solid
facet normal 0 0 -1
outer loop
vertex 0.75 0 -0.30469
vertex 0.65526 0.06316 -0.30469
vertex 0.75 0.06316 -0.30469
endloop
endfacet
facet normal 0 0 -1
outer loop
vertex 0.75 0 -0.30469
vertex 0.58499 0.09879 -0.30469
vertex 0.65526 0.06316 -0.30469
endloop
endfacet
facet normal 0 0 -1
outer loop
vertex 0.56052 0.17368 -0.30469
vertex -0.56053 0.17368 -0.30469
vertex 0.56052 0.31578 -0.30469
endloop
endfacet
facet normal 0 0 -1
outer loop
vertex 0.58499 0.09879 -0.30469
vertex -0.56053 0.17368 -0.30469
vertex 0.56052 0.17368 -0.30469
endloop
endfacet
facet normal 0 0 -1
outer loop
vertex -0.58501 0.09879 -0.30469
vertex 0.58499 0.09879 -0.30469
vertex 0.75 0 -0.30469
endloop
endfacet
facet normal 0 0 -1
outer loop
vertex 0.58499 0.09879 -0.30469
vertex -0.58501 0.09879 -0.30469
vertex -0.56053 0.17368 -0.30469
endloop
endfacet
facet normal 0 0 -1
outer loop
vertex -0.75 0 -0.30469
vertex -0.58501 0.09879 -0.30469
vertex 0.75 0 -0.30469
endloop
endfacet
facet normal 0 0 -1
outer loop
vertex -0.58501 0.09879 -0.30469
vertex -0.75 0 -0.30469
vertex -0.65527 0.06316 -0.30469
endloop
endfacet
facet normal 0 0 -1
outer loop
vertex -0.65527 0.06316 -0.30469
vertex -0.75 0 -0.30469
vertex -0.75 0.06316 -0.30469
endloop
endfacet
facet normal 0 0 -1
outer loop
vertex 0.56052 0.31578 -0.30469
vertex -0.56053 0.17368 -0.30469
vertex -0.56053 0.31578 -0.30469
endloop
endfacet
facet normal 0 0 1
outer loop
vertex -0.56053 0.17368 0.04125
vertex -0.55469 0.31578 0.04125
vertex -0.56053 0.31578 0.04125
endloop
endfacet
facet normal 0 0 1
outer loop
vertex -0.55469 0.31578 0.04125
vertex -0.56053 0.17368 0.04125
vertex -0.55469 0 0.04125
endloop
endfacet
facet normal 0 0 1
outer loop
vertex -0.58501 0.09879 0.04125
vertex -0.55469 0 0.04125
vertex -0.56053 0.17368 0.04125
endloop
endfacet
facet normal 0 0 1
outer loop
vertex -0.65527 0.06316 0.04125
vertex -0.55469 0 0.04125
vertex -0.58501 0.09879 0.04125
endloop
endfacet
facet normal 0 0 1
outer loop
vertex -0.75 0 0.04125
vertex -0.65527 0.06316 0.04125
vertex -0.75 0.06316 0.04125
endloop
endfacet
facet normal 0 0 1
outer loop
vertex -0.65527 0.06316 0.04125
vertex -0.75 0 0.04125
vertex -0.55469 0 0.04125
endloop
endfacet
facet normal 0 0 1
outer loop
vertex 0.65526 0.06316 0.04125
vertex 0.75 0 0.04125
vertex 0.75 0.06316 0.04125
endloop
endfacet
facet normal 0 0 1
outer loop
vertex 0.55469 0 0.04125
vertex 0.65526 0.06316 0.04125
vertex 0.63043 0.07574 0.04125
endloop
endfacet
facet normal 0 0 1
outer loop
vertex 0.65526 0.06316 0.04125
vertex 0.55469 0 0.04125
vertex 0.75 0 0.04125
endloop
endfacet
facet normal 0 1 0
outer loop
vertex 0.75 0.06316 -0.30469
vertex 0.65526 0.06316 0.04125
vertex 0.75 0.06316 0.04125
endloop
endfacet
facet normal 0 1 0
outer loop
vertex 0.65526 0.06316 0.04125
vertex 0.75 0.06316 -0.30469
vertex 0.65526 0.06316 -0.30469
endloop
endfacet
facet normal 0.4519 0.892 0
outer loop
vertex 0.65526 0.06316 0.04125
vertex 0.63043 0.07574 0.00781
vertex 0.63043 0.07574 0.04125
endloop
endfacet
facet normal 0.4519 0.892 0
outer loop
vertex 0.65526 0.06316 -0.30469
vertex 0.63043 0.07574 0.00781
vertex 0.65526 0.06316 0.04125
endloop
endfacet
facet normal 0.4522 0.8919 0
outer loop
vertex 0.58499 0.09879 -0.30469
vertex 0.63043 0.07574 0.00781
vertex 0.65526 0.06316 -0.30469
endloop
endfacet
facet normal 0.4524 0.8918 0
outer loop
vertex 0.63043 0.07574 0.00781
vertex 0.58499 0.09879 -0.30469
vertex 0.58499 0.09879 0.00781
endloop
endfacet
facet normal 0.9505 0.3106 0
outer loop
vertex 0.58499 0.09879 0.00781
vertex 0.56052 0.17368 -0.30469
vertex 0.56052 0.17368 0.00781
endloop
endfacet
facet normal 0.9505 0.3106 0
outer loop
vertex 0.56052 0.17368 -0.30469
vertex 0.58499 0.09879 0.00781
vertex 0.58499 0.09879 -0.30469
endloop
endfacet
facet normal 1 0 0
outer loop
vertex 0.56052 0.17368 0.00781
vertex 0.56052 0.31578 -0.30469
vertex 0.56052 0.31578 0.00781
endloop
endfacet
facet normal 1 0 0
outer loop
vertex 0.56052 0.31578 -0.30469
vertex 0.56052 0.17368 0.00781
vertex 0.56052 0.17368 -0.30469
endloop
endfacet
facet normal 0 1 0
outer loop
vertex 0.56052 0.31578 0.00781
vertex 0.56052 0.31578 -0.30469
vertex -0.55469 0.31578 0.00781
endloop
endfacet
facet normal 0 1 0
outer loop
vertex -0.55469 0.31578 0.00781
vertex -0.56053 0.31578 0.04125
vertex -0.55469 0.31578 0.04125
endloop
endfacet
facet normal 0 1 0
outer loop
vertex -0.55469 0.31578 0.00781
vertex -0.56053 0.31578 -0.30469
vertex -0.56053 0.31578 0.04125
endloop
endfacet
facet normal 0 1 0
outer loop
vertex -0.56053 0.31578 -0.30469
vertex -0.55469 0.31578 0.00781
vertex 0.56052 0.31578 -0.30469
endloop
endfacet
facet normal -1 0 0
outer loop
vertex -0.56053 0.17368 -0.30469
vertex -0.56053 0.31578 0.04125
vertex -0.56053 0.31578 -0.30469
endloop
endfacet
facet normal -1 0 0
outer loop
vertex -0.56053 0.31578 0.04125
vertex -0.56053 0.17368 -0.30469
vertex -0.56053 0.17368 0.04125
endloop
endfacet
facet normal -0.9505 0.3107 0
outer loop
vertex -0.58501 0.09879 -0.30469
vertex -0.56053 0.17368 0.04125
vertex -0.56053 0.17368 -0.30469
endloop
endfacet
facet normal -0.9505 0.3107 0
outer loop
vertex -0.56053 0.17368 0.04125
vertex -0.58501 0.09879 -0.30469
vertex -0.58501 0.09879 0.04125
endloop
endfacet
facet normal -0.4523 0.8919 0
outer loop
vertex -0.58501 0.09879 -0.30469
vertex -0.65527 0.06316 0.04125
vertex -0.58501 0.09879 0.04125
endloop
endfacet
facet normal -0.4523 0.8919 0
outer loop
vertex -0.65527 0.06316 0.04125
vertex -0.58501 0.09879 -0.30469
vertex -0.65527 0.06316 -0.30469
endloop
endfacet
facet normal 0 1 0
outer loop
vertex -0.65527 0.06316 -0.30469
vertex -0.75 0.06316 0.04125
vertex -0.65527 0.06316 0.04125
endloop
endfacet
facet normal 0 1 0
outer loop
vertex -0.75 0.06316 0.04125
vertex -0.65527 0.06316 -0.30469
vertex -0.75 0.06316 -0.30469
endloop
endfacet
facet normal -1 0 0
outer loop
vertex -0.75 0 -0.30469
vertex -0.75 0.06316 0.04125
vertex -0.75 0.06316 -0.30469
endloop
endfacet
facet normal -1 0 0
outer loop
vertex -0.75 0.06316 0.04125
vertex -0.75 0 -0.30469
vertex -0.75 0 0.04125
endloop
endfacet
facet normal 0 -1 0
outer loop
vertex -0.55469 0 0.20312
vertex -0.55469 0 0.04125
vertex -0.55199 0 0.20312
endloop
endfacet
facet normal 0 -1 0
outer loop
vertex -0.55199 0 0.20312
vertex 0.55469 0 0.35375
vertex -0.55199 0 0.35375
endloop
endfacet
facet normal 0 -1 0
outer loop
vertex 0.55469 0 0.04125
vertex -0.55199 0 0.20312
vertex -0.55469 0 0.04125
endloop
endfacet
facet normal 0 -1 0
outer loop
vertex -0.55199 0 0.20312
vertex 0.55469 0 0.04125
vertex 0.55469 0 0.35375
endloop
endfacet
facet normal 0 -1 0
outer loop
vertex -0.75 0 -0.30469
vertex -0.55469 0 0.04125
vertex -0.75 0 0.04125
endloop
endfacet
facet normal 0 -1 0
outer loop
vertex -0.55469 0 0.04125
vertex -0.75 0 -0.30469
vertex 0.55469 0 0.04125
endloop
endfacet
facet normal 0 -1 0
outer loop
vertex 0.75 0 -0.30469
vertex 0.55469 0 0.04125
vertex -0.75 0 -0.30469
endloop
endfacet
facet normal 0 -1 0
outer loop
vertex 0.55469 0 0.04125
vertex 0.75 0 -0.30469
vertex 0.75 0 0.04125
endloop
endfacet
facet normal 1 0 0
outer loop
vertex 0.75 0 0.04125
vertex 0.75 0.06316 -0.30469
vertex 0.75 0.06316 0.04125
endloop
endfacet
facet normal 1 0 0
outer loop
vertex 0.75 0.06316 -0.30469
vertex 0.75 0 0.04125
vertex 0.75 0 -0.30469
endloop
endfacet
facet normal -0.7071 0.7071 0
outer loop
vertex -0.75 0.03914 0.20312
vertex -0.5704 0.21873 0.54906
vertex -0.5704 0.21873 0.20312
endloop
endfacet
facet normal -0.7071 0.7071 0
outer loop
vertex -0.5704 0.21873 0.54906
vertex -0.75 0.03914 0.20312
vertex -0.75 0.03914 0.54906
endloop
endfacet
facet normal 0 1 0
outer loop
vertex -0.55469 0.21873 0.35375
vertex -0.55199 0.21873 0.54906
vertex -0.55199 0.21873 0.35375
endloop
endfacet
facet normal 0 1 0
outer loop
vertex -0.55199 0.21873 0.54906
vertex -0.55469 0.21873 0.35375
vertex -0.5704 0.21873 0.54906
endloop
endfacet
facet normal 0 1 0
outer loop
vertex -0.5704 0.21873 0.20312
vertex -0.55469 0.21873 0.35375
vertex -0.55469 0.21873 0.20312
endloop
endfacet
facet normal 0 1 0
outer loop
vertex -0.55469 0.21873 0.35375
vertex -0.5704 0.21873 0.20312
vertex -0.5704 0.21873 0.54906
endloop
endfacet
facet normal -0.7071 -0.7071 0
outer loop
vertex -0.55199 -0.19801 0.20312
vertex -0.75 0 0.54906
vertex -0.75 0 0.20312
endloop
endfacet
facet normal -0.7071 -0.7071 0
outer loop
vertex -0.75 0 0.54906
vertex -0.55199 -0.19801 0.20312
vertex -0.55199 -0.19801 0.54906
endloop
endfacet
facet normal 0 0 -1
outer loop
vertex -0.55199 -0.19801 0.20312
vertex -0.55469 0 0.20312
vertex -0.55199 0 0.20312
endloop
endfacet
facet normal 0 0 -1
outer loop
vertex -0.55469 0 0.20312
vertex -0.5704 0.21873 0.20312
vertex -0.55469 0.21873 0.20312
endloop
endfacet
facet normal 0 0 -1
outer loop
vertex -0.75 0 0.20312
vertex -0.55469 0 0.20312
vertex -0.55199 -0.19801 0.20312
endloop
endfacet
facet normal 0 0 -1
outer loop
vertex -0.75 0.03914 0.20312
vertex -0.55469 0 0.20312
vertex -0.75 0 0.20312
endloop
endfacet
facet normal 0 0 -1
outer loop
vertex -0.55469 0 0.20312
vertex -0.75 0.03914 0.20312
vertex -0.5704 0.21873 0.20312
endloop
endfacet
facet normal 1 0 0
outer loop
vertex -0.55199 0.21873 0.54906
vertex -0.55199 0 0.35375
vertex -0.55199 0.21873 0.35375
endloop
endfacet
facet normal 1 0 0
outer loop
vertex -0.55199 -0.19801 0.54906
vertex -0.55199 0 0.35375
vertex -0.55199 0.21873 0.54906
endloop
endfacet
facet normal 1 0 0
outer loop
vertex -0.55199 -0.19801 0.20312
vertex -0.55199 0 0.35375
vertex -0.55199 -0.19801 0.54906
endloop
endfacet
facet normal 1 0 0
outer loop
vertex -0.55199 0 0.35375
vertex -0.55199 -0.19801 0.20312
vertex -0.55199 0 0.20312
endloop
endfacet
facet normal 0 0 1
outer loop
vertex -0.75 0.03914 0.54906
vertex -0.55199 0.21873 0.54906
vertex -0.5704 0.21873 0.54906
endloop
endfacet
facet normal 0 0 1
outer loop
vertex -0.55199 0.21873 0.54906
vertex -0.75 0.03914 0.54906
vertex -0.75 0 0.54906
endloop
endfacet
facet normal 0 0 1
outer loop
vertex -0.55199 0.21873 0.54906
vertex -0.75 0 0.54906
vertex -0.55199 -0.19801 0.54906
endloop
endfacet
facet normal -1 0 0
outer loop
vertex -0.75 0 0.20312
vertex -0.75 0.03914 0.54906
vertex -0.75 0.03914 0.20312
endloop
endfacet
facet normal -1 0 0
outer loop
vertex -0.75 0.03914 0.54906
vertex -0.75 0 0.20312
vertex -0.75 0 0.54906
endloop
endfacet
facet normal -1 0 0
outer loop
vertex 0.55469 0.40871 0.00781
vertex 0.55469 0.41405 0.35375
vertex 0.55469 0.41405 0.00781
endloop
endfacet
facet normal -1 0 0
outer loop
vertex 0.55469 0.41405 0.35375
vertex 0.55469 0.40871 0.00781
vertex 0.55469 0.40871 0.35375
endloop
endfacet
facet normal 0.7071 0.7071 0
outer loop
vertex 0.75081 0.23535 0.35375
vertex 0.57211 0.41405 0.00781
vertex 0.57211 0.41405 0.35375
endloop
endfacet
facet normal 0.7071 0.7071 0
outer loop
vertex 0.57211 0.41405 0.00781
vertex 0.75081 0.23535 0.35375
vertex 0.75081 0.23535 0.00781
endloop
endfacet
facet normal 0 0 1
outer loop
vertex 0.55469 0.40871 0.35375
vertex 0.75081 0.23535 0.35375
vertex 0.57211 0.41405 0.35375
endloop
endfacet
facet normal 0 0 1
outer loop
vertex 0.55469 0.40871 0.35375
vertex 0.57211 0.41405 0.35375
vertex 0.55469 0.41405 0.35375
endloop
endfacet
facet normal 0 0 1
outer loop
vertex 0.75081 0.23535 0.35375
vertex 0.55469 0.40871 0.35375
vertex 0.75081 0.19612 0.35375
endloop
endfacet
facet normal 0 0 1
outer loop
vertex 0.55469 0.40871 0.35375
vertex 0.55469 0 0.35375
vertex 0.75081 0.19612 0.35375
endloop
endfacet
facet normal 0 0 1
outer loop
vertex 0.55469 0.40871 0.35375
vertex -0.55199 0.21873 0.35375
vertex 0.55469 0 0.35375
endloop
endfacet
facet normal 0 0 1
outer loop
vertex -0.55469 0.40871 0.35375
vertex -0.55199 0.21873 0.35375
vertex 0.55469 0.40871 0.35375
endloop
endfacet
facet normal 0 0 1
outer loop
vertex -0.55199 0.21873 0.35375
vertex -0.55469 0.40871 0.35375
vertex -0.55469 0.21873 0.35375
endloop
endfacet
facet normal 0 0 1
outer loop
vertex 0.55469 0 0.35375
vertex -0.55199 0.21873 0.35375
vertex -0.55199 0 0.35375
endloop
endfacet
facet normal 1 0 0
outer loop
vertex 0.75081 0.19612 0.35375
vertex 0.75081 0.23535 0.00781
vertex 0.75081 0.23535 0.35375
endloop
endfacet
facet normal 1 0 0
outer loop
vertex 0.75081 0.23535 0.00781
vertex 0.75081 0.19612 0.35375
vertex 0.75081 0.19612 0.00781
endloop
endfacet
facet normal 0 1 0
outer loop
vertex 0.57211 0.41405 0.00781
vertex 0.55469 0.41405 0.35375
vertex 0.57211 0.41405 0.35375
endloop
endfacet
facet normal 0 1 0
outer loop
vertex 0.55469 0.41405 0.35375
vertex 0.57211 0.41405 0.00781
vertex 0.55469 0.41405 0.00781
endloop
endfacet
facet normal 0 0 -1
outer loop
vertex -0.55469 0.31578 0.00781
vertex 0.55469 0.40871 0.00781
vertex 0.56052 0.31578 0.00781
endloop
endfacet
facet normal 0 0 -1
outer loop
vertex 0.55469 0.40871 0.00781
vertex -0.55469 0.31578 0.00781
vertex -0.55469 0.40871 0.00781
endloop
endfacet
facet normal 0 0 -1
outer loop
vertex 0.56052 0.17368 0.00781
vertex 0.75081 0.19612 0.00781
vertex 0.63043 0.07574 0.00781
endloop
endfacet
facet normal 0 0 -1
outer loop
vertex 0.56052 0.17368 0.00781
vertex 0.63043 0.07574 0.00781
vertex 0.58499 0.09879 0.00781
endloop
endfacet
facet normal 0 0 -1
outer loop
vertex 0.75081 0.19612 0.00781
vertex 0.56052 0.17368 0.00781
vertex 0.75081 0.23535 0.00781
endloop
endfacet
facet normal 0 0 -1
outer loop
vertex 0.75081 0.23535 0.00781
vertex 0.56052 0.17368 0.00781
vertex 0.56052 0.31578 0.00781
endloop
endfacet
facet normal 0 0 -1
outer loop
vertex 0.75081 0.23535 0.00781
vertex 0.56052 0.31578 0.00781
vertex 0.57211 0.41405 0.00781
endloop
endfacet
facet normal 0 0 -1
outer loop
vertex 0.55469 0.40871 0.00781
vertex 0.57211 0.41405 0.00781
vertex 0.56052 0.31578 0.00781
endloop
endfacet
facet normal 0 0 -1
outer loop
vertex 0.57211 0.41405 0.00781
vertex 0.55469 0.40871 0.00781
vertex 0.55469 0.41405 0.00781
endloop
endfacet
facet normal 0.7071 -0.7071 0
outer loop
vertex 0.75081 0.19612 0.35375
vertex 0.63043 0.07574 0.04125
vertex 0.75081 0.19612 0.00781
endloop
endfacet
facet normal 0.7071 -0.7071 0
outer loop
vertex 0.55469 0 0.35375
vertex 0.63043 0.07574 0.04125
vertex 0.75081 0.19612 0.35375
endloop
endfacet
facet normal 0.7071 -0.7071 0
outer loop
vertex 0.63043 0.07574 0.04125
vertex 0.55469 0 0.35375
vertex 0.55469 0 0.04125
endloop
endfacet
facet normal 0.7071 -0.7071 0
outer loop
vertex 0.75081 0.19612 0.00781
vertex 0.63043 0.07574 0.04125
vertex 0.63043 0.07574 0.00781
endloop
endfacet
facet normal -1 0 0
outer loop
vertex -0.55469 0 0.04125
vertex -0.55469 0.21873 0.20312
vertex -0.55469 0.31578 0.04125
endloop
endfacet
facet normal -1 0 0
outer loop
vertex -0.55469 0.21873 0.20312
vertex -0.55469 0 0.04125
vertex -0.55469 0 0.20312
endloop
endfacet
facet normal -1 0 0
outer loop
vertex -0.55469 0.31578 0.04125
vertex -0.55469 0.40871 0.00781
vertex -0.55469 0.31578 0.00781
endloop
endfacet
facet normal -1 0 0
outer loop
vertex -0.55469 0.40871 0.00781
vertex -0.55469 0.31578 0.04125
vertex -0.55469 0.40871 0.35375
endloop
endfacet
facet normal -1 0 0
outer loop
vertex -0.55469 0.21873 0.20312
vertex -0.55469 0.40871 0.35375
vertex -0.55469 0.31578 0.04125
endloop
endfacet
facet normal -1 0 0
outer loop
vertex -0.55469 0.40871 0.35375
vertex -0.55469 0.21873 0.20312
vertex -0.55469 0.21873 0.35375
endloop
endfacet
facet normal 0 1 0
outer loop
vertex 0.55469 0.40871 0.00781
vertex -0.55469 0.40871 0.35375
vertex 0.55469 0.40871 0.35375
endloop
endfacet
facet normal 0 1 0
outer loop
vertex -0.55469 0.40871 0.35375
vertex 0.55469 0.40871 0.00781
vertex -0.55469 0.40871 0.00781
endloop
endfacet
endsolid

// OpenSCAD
EPS = 0.01;

module sketch0() {
    translate([-0.75, 0.0, -0.3046875])
    linear_extrude(height=0.3359375 + EPS)
    polygon(points=[
        [1.5, 0.0],
        [1.5, 0.06315789473684211],
        [1.405263157894737, 0.06315789473684211],
        [1.3350039873425394, 0.09880041020337962],
        [1.3105263157894738, 0.1736842105263158],
        [1.3105263157894738, 0.3157894736842105],
        [0.18947368421052632, 0.3157894736842105],
        [0.18947368421052632, 0.1736842105263158],
        [0.1649960126574607, 0.09880041020337962],
        [0.09473684210526316, 0.06315789473684211],
        [0.0, 0.06315789473684211],
        [0.0, 0.0]
    ]);
}

module sketch1() {
    translate([-0.75, 0.0, 0.203125])
    linear_extrude(height=0.3359375 + EPS)
    polygon(points=[
        [0.19802631578947366, -0.19802631578947366],
        [0.19802631578947366, 0.21874999999999997],
        [0.1796052631578947, 0.21874999999999997],
        [0.0, 0.03914473684210526],
        [0.0, 0.0]
    ]);
}

module sketch2() {
    translate([0.5546875, 0.0, 0.0078125])
    linear_extrude(height=0.3359375 + EPS)
    polygon(points=[
        [0.19613486842105263, 0.19613486842105263],
        [0.19613486842105263, 0.23536184210526315],
        [0.017434210526315788, 0.41406249999999994],
        [0.0, 0.41406249999999994],
        [0.0, 0.0]
    ]);
}

module sketch3() {
    translate([-0.5546875, 0.0, 0.0078125])
    linear_extrude(height=0.3359375 + EPS)
    polygon(points=[
        [1.109375, 0.0],
        [1.109375, 0.4087171052631579],
        [0.0, 0.4087171052631579],
        [0.0, 0.0]
    ]);
}

union() {
    sketch0();
    sketch1();
    sketch2();
    sketch3();
}
